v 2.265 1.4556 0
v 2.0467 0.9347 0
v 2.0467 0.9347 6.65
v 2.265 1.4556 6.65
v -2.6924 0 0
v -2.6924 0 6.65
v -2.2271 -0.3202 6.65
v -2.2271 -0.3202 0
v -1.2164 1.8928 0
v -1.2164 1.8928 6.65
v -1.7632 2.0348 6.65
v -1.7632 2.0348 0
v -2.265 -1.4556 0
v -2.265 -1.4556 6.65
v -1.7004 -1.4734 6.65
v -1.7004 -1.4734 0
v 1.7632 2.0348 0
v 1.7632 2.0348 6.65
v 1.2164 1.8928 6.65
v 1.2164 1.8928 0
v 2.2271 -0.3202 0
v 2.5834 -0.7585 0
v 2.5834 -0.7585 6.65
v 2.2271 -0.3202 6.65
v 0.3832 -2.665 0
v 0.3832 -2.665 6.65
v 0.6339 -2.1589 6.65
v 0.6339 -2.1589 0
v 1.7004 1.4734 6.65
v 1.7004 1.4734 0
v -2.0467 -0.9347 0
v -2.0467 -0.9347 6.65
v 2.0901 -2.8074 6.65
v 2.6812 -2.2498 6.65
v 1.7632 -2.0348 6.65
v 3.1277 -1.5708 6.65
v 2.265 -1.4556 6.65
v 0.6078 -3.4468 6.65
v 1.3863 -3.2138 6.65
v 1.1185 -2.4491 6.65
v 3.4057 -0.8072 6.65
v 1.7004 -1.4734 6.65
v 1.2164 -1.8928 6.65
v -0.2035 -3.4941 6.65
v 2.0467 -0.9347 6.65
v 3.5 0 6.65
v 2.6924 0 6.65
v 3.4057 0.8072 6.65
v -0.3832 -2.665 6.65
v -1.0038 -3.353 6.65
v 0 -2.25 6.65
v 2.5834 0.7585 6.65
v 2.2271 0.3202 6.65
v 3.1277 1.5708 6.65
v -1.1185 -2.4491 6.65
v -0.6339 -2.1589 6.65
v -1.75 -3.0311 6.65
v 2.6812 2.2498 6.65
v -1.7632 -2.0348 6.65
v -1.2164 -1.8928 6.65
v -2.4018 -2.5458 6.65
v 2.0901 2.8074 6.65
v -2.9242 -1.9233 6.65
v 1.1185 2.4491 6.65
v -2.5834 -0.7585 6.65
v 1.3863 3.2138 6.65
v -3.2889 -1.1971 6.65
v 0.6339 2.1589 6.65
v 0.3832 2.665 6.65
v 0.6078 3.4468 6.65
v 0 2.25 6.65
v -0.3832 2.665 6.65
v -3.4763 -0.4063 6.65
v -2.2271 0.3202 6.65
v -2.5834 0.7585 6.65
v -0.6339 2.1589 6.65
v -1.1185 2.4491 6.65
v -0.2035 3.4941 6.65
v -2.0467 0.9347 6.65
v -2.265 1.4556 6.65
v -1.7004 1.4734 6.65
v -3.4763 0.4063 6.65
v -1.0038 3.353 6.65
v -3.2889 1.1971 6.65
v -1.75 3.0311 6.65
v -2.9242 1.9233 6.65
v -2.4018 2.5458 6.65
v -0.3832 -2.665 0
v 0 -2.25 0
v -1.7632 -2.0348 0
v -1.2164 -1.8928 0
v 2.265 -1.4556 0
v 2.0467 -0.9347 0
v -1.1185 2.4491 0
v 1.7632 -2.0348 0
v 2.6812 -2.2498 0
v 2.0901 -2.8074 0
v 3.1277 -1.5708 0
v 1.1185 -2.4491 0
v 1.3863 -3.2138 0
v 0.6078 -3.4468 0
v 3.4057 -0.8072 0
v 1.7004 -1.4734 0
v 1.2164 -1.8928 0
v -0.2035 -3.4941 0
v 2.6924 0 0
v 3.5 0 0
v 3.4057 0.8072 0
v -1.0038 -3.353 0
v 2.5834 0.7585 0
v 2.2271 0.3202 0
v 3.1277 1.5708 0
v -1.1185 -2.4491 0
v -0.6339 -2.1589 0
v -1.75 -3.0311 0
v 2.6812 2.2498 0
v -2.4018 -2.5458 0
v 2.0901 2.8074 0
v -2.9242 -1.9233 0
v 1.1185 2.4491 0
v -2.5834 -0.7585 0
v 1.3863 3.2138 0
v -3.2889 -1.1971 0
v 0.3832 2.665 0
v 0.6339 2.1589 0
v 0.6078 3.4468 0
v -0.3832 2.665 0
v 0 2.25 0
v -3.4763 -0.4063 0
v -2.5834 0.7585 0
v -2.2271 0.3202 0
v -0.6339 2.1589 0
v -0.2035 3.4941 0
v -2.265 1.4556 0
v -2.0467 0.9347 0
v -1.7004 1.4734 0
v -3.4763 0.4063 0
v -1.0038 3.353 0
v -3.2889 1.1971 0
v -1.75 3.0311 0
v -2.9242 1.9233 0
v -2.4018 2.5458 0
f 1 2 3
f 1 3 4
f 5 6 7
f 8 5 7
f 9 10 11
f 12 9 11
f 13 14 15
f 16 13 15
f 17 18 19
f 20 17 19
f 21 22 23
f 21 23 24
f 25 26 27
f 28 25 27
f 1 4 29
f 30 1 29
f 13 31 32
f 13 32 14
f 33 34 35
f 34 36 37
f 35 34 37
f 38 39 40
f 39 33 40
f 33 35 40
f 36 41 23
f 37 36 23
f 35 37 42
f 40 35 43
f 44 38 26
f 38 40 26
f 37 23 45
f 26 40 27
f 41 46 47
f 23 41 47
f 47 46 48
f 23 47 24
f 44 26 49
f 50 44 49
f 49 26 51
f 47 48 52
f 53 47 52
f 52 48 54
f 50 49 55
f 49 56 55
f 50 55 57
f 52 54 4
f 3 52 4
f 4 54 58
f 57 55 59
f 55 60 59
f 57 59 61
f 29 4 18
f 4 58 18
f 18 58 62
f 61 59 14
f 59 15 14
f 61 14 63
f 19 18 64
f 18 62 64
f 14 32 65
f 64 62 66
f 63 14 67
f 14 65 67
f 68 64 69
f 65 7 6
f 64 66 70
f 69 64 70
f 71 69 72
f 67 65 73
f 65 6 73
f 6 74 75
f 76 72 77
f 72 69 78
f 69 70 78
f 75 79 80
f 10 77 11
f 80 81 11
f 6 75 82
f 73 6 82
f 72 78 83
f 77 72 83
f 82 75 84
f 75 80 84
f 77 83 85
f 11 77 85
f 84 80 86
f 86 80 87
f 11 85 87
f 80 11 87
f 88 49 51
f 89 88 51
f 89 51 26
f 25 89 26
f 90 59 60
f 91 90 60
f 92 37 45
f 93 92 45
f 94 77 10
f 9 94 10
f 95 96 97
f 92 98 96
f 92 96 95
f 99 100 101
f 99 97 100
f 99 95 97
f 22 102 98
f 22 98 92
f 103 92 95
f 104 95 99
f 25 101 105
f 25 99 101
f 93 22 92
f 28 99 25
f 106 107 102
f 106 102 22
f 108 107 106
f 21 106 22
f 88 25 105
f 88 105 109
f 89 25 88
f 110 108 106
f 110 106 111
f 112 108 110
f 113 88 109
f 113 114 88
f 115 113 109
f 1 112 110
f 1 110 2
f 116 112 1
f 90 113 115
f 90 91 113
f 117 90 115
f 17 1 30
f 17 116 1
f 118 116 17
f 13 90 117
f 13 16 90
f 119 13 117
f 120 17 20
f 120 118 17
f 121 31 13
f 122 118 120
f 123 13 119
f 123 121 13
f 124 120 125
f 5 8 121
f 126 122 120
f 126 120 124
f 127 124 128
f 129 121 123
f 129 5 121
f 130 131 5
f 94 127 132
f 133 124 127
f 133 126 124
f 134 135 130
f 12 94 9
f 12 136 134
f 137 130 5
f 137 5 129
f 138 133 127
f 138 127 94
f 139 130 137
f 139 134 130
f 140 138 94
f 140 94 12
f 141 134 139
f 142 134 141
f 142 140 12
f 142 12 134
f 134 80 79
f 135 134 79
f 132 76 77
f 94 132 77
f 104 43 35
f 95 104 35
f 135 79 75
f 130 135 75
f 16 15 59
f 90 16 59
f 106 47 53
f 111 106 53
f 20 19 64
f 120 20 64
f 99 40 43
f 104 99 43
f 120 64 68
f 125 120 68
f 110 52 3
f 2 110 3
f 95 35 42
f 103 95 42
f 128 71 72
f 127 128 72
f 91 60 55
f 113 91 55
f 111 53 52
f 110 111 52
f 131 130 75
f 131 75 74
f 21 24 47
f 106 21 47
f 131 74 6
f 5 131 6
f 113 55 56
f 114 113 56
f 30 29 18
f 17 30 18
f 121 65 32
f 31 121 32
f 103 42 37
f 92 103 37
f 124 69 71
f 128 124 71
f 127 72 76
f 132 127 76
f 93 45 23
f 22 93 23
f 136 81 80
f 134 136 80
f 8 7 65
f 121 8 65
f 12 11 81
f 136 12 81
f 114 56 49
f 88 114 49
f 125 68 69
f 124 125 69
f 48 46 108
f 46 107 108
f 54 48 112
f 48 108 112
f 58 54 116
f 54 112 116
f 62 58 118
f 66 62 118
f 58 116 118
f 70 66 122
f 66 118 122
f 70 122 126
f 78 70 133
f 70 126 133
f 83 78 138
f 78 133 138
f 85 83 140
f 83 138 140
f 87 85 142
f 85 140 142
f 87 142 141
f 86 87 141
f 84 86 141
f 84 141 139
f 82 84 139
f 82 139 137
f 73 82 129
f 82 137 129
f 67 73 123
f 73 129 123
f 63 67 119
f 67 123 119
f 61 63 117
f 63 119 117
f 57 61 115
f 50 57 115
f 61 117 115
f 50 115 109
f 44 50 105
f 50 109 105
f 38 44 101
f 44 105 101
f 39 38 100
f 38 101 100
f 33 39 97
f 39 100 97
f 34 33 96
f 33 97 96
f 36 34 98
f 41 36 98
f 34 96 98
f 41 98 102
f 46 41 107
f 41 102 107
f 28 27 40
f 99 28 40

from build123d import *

# Parameters (mm, degrees)
SKETCH1_W          = 3.5
SKETCH1_H          = 6.65
CUT_EXTRUDE1_DEPTH = 9
CUT_EXTRUDE3_DEPTH = 10


with BuildPart() as part:
    # Sketch1 → Revolve1 (revolve)
    with BuildSketch(Plane(origin=(0, 0, 0), x_dir=(1, 0, 0), z_dir=(0, 1, 0))):
        with Locations((1.75, -3.325)):
            Rectangle(SKETCH1_W, SKETCH1_H)
    revolve(axis=Axis((0, 0, 0), (0, 0, 1)))

    # Sketch3 → Cut-Extrude1 (cut)
    with BuildSketch(Plane.XY.offset(6.65)):
        Polygon((2.06028803, 1.324066719), (1.700436542, 1.473436651), (1.603799186, 1.850882928), (1.216441839, 1.892820449), (1.017380071, 2.227751609), (0.633898253, 2.158859191), (0.348538872, 2.424141105), (0, 2.25), (-0.348538872, 2.424141105), (-0.633898253, 2.158859191), (-1.017380071, 2.227751609), (-1.216441839, 1.892820449), (-1.603799186, 1.850882928), (-1.700436542, 1.473436651), (-2.06028803, 1.324066719), (-2.04667199, 0.934683779), (-2.34986459, 0.689982499), (-2.227098244, 0.320208386), (-2.449069097, 0), (-2.227098244, -0.320208386), (-2.34986459, -0.689982499), (-2.04667199, -0.934683779), (-2.06028803, -1.324066719), (-1.700436542, -1.473436651), (-1.603799186, -1.850882928), (-1.216441839, -1.892820449), (-1.017380071, -2.227751609), (-0.633898253, -2.158859191), (-0.348538872, -2.424141105), (0, -2.25), (0.348538872, -2.424141105), (0.633898253, -2.158859191), (1.017380071, -2.227751609), (1.216441839, -1.892820449), (1.603799186, -1.850882928), (1.700436542, -1.473436651), (2.06028803, -1.324066719), (2.04667199, -0.934683779), (2.34986459, -0.689982499), (2.227098244, -0.320208386), (2.449069097, 0), (2.227098244, 0.320208386), (2.34986459, 0.689982499), (2.04667199, 0.934683779), align=None)
    extrude(amount=-CUT_EXTRUDE1_DEPTH, mode=Mode.SUBTRACT)

    # Sketch9 → Cut-Extrude3 (cut)
    with BuildSketch(Plane.XY.offset(6.65)):
        Polygon((0, -2.25), (0.383171844, -2.665018714), (0.633898253, -2.158859191), (1.118473228, -2.449114747), (1.216441839, -1.892820449), (1.763162563, -2.034798069), (1.700436542, -1.473436651), (2.265010954, -1.455634153), (2.04667199, -0.934683779), (2.583361627, -0.758543414), (2.227098244, -0.320208386), (2.692423705, 0), (2.227098244, 0.320208386), (2.583361627, 0.758543414), (2.04667199, 0.934683779), (2.265010954, 1.455634153), (1.700436542, 1.473436651), (1.763162563, 2.034798069), (1.216441839, 1.892820449), (1.118473228, 2.449114747), (0.633898253, 2.158859191), (0.383171844, 2.665018714), (0, 2.25), (-0.383171844, 2.665018714), (-0.633898253, 2.158859191), (-1.118473228, 2.449114747), (-1.216441839, 1.892820449), (-1.763162563, 2.034798069), (-1.700436542, 1.473436651), (-2.265010954, 1.455634153), (-2.04667199, 0.934683779), (-2.583361627, 0.758543414), (-2.227098244, 0.320208386), (-2.692423705, 0), (-2.227098244, -0.320208386), (-2.583361627, -0.758543414), (-2.04667199, -0.934683779), (-2.265010954, -1.455634153), (-1.700436542, -1.473436651), (-1.763162563, -2.034798069), (-1.216441839, -1.892820449), (-1.118473228, -2.449114747), (-0.633898253, -2.158859191), (-0.383171844, -2.665018714), align=None)
    extrude(amount=-CUT_EXTRUDE3_DEPTH, mode=Mode.SUBTRACT)


solid = part.part
